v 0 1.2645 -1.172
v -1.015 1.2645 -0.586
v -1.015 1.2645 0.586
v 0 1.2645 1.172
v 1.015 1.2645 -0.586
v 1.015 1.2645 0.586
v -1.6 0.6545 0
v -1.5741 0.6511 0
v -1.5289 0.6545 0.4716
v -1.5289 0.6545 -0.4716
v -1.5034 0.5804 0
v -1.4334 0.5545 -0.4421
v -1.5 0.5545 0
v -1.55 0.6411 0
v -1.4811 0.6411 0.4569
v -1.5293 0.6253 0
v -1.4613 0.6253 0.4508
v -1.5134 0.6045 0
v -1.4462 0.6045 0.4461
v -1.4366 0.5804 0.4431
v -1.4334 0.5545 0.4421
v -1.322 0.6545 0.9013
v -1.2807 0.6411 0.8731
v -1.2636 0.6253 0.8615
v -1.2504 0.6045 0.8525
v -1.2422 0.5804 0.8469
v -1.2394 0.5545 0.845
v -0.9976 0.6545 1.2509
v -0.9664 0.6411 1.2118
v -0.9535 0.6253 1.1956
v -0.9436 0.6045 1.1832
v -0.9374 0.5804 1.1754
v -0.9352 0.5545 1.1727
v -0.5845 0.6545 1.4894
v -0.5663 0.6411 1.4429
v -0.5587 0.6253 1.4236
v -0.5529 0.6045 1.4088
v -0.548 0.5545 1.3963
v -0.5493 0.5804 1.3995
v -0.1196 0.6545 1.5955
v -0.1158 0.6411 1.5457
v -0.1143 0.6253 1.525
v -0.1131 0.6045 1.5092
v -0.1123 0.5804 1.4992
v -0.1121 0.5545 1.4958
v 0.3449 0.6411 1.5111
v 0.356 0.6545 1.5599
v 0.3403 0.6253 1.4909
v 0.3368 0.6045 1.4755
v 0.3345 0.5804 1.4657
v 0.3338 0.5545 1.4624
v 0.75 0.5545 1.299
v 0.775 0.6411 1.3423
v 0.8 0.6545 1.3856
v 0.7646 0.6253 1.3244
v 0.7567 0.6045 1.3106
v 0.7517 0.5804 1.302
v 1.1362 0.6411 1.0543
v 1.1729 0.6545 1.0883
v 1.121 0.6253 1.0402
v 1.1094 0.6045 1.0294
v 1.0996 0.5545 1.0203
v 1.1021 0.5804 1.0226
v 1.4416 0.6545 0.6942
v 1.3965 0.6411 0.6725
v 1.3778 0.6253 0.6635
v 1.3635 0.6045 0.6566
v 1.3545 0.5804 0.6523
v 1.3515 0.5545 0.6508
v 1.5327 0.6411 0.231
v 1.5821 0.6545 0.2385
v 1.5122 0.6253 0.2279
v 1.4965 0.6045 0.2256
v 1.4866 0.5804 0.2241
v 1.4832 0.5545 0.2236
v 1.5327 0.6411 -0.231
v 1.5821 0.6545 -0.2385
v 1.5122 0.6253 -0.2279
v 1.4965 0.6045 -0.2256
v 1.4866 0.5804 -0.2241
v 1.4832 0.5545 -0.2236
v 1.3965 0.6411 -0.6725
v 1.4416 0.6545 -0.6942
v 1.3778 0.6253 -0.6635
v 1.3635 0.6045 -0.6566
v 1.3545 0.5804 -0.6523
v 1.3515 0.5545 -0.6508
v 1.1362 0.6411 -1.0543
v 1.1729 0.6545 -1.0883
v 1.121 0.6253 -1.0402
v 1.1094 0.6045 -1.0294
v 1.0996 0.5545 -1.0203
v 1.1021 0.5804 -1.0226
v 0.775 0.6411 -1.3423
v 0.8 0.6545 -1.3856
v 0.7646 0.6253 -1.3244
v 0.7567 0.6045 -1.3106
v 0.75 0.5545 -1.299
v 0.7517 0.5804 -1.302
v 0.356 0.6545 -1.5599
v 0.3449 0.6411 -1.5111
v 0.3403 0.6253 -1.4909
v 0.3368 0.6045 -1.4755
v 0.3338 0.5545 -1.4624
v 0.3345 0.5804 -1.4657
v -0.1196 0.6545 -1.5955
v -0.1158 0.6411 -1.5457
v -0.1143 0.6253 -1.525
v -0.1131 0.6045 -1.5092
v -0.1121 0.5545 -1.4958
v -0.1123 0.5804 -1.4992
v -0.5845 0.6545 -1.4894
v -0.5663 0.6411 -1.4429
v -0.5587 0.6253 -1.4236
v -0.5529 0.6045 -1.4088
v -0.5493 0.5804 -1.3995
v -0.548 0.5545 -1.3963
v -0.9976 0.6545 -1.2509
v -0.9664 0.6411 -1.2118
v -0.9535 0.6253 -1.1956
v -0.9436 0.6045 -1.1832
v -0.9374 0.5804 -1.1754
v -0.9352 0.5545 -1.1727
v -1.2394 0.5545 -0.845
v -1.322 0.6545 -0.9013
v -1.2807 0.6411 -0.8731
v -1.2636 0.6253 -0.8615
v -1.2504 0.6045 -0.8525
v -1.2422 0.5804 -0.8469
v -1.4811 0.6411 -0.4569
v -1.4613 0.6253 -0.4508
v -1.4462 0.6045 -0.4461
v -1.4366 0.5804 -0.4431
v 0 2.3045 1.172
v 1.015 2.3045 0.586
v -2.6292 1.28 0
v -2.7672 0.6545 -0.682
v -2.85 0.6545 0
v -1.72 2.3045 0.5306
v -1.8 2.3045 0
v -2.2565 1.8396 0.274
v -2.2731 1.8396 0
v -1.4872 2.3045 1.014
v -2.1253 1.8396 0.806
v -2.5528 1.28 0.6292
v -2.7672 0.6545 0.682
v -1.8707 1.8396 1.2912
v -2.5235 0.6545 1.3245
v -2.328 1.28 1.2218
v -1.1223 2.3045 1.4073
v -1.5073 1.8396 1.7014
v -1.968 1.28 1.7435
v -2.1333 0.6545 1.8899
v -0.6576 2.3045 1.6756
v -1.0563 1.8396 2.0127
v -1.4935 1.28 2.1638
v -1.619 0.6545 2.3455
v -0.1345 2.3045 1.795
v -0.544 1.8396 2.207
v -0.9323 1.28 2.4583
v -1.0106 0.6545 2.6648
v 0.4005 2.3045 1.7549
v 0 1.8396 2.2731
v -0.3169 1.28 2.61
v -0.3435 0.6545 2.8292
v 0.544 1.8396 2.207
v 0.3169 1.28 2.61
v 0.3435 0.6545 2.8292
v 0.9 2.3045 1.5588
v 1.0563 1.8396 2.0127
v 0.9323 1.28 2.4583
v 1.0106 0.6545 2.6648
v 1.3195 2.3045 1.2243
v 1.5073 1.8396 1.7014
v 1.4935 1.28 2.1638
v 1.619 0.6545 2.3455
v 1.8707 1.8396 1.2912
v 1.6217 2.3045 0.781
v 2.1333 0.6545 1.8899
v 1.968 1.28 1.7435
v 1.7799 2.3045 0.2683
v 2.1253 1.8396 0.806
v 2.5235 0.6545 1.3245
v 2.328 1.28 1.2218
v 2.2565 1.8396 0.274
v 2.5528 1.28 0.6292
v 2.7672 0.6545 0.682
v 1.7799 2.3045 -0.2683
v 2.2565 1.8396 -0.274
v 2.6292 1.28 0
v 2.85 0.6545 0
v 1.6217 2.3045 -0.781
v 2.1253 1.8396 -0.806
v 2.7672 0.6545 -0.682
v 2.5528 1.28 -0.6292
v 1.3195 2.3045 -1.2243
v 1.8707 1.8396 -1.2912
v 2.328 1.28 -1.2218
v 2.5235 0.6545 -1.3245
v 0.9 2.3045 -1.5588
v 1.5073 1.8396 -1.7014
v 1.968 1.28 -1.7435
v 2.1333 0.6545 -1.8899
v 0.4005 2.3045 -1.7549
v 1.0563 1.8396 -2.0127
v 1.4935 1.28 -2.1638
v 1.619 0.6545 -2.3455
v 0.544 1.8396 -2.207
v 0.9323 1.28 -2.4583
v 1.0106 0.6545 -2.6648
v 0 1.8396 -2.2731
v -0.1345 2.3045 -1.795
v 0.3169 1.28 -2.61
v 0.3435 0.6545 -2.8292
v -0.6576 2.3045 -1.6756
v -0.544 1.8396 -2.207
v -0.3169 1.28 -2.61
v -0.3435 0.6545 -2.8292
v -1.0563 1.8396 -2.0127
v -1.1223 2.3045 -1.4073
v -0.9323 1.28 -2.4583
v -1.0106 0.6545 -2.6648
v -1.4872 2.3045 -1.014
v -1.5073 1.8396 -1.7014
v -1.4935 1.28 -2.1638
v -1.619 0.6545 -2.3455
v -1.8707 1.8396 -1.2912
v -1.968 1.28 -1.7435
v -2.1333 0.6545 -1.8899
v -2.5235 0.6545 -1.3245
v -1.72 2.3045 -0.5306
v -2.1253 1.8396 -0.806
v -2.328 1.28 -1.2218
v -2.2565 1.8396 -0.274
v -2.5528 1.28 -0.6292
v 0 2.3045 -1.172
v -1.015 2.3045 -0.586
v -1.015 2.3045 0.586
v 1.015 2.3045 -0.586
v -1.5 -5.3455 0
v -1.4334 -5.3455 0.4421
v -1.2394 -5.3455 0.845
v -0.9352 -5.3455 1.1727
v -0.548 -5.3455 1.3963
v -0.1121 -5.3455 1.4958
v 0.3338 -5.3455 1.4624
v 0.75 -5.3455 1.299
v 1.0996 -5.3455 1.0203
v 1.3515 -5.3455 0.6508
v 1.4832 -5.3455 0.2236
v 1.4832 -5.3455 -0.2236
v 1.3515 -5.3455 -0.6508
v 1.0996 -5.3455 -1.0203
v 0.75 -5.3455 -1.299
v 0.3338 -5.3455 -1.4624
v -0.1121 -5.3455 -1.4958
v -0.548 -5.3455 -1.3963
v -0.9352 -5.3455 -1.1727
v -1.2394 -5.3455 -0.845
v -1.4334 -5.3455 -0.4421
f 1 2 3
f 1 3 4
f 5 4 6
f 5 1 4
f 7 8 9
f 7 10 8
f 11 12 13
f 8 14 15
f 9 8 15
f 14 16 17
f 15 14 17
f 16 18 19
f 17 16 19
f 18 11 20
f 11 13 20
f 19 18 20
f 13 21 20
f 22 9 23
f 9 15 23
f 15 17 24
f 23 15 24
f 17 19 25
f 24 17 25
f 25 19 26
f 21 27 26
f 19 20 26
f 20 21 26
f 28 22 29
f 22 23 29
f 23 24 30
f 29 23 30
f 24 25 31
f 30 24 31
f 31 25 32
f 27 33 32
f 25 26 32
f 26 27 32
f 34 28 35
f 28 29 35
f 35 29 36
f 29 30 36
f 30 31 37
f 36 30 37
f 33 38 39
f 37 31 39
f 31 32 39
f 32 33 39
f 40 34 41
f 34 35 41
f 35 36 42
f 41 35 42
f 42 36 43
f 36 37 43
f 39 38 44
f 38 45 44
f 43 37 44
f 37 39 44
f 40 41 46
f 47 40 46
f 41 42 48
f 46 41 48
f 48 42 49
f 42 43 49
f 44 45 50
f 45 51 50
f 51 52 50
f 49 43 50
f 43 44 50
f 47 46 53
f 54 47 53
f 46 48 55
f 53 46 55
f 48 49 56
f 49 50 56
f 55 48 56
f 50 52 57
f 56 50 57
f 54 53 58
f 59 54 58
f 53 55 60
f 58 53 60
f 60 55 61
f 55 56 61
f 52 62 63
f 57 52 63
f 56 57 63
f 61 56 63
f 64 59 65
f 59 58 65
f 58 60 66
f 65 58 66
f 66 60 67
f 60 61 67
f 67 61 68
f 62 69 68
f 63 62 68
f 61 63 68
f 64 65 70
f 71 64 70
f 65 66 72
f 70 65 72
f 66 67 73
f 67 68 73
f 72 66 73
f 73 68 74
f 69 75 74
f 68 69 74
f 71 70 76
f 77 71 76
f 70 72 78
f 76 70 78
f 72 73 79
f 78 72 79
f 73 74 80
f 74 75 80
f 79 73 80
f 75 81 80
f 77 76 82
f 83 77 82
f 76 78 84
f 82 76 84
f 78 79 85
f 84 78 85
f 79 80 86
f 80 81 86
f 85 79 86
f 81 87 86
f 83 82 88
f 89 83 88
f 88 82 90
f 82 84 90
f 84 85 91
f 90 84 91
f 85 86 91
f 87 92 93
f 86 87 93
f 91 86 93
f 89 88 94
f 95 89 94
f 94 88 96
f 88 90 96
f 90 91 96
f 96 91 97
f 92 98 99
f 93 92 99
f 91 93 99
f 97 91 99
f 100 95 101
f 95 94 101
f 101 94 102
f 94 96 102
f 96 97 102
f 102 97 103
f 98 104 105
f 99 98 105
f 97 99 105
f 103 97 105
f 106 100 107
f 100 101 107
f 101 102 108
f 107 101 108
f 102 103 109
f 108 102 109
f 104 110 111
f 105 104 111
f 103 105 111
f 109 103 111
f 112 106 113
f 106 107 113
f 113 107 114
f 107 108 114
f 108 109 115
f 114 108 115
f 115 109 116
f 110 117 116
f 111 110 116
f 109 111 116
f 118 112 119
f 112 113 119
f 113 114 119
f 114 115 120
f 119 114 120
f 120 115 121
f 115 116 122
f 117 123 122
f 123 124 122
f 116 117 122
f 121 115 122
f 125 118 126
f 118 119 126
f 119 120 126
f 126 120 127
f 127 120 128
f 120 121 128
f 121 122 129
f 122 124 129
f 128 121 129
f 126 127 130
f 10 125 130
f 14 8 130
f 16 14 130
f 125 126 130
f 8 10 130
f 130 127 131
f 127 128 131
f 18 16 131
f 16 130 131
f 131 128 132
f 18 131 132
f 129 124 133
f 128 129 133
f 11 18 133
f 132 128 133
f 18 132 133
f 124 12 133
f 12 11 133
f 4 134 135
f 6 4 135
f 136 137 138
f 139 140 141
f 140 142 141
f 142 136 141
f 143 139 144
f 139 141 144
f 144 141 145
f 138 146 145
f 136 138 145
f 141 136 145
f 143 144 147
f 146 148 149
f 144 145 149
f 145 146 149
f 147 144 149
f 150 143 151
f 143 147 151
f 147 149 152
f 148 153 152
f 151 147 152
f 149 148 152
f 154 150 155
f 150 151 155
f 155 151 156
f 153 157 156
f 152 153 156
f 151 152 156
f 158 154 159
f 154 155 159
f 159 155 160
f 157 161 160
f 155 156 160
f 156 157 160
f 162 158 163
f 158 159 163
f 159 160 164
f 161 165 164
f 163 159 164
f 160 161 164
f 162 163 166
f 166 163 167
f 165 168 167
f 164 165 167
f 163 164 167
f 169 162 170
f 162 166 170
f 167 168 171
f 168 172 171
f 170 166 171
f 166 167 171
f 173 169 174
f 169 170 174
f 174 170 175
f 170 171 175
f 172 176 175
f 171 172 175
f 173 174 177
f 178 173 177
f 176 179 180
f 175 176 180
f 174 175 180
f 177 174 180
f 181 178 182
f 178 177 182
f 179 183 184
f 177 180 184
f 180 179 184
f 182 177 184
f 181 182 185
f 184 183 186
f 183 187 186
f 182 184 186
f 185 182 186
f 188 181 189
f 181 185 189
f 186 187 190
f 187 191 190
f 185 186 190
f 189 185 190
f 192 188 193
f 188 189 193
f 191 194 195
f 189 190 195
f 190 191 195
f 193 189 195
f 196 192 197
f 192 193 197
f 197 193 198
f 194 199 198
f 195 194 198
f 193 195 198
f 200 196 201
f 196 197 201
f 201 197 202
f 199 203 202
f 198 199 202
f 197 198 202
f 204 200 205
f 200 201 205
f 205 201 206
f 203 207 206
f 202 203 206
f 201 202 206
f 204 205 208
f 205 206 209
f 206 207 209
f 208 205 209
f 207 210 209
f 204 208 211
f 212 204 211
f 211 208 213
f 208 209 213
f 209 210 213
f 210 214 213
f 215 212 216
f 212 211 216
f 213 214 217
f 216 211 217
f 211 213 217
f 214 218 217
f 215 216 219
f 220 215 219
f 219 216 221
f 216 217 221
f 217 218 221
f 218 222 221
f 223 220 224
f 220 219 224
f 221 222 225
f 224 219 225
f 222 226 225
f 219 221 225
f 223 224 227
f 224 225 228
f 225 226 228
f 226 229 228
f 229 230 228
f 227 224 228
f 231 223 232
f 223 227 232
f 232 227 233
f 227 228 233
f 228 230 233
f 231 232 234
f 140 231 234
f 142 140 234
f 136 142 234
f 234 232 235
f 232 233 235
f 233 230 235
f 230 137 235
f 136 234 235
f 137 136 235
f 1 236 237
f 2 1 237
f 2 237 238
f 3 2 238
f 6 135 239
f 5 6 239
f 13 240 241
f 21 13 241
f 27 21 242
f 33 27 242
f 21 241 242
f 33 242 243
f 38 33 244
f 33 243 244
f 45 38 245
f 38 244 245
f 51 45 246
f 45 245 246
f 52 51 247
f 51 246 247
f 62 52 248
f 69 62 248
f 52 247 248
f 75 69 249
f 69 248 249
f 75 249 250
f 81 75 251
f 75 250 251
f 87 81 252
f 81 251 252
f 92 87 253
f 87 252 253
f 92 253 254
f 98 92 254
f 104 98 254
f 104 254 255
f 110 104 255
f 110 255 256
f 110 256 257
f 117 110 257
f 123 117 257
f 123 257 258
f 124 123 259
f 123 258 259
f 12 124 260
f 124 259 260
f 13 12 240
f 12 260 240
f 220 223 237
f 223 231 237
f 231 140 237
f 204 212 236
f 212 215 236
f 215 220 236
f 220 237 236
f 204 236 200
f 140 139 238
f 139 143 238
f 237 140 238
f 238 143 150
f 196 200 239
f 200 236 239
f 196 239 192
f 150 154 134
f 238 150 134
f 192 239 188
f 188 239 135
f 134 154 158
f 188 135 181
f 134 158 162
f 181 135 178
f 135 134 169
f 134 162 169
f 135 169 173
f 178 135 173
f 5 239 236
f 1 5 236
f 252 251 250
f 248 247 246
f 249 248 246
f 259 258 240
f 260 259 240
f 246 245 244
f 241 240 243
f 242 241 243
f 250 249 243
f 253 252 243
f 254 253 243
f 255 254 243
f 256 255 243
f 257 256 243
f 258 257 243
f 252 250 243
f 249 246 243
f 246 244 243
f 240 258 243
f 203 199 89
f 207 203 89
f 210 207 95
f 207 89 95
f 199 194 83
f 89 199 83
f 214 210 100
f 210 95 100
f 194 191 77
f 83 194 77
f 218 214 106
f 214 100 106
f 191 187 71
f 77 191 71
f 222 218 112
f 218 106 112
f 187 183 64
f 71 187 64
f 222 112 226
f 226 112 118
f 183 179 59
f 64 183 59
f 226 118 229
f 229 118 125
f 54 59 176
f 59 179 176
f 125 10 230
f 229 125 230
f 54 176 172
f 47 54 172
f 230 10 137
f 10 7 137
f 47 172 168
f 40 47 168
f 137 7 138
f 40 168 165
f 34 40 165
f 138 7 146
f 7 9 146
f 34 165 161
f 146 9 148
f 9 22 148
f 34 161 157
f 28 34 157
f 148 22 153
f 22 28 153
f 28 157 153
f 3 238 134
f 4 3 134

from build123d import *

# Parameters (mm, degrees)
CUT_EXTRUDE_1_DEPTH = 1.04
FILLET_1_R          = 0.1


with BuildPart() as part:
    # 草图1 → 旋转1 (revolve)
    with BuildSketch(Plane.XY):
        with BuildLine():
            Line((0, 2.304545455), (-1.8, 2.304545455))
            ThreePointArc((-1.8, 2.304545455), (-2.467032631, 1.569929856), (-2.85, 0.654545455))
            Line((-2.85, 0.654545455), (-1.5, 0.654545455))
            Line((-1.5, 0.654545455), (-1.5, -5.345454545))
            Line((-1.5, -5.345454545), (0, -5.345454545))
            Line((0, -5.345454545), (0, 2.304545455))
        make_face()
    revolve(axis=Axis((0, 0, 0), (0, 1, 0)))

    # 草图2 → 切除-拉伸1 (cut)
    with BuildSketch(Plane(origin=(0, 2.304545455, 0), x_dir=(1, 0, 0), z_dir=(0, 1, 0))):
        Polygon((0, -1.172021046), (1.015, -0.586010523), (1.015, 0.586010523), (0, 1.172021046), (-1.015, 0.586010523), (-1.015, -0.586010523), align=None)
    extrude(amount=-CUT_EXTRUDE_1_DEPTH, mode=Mode.SUBTRACT)

    # 圆角1
    fillet_1_edges = [part.edges().sort_by_distance(p)[0] for p in [
        (1.5, 0.654545455, 0),
    ]]
    fillet(fillet_1_edges, radius=FILLET_1_R)


solid = part.part
